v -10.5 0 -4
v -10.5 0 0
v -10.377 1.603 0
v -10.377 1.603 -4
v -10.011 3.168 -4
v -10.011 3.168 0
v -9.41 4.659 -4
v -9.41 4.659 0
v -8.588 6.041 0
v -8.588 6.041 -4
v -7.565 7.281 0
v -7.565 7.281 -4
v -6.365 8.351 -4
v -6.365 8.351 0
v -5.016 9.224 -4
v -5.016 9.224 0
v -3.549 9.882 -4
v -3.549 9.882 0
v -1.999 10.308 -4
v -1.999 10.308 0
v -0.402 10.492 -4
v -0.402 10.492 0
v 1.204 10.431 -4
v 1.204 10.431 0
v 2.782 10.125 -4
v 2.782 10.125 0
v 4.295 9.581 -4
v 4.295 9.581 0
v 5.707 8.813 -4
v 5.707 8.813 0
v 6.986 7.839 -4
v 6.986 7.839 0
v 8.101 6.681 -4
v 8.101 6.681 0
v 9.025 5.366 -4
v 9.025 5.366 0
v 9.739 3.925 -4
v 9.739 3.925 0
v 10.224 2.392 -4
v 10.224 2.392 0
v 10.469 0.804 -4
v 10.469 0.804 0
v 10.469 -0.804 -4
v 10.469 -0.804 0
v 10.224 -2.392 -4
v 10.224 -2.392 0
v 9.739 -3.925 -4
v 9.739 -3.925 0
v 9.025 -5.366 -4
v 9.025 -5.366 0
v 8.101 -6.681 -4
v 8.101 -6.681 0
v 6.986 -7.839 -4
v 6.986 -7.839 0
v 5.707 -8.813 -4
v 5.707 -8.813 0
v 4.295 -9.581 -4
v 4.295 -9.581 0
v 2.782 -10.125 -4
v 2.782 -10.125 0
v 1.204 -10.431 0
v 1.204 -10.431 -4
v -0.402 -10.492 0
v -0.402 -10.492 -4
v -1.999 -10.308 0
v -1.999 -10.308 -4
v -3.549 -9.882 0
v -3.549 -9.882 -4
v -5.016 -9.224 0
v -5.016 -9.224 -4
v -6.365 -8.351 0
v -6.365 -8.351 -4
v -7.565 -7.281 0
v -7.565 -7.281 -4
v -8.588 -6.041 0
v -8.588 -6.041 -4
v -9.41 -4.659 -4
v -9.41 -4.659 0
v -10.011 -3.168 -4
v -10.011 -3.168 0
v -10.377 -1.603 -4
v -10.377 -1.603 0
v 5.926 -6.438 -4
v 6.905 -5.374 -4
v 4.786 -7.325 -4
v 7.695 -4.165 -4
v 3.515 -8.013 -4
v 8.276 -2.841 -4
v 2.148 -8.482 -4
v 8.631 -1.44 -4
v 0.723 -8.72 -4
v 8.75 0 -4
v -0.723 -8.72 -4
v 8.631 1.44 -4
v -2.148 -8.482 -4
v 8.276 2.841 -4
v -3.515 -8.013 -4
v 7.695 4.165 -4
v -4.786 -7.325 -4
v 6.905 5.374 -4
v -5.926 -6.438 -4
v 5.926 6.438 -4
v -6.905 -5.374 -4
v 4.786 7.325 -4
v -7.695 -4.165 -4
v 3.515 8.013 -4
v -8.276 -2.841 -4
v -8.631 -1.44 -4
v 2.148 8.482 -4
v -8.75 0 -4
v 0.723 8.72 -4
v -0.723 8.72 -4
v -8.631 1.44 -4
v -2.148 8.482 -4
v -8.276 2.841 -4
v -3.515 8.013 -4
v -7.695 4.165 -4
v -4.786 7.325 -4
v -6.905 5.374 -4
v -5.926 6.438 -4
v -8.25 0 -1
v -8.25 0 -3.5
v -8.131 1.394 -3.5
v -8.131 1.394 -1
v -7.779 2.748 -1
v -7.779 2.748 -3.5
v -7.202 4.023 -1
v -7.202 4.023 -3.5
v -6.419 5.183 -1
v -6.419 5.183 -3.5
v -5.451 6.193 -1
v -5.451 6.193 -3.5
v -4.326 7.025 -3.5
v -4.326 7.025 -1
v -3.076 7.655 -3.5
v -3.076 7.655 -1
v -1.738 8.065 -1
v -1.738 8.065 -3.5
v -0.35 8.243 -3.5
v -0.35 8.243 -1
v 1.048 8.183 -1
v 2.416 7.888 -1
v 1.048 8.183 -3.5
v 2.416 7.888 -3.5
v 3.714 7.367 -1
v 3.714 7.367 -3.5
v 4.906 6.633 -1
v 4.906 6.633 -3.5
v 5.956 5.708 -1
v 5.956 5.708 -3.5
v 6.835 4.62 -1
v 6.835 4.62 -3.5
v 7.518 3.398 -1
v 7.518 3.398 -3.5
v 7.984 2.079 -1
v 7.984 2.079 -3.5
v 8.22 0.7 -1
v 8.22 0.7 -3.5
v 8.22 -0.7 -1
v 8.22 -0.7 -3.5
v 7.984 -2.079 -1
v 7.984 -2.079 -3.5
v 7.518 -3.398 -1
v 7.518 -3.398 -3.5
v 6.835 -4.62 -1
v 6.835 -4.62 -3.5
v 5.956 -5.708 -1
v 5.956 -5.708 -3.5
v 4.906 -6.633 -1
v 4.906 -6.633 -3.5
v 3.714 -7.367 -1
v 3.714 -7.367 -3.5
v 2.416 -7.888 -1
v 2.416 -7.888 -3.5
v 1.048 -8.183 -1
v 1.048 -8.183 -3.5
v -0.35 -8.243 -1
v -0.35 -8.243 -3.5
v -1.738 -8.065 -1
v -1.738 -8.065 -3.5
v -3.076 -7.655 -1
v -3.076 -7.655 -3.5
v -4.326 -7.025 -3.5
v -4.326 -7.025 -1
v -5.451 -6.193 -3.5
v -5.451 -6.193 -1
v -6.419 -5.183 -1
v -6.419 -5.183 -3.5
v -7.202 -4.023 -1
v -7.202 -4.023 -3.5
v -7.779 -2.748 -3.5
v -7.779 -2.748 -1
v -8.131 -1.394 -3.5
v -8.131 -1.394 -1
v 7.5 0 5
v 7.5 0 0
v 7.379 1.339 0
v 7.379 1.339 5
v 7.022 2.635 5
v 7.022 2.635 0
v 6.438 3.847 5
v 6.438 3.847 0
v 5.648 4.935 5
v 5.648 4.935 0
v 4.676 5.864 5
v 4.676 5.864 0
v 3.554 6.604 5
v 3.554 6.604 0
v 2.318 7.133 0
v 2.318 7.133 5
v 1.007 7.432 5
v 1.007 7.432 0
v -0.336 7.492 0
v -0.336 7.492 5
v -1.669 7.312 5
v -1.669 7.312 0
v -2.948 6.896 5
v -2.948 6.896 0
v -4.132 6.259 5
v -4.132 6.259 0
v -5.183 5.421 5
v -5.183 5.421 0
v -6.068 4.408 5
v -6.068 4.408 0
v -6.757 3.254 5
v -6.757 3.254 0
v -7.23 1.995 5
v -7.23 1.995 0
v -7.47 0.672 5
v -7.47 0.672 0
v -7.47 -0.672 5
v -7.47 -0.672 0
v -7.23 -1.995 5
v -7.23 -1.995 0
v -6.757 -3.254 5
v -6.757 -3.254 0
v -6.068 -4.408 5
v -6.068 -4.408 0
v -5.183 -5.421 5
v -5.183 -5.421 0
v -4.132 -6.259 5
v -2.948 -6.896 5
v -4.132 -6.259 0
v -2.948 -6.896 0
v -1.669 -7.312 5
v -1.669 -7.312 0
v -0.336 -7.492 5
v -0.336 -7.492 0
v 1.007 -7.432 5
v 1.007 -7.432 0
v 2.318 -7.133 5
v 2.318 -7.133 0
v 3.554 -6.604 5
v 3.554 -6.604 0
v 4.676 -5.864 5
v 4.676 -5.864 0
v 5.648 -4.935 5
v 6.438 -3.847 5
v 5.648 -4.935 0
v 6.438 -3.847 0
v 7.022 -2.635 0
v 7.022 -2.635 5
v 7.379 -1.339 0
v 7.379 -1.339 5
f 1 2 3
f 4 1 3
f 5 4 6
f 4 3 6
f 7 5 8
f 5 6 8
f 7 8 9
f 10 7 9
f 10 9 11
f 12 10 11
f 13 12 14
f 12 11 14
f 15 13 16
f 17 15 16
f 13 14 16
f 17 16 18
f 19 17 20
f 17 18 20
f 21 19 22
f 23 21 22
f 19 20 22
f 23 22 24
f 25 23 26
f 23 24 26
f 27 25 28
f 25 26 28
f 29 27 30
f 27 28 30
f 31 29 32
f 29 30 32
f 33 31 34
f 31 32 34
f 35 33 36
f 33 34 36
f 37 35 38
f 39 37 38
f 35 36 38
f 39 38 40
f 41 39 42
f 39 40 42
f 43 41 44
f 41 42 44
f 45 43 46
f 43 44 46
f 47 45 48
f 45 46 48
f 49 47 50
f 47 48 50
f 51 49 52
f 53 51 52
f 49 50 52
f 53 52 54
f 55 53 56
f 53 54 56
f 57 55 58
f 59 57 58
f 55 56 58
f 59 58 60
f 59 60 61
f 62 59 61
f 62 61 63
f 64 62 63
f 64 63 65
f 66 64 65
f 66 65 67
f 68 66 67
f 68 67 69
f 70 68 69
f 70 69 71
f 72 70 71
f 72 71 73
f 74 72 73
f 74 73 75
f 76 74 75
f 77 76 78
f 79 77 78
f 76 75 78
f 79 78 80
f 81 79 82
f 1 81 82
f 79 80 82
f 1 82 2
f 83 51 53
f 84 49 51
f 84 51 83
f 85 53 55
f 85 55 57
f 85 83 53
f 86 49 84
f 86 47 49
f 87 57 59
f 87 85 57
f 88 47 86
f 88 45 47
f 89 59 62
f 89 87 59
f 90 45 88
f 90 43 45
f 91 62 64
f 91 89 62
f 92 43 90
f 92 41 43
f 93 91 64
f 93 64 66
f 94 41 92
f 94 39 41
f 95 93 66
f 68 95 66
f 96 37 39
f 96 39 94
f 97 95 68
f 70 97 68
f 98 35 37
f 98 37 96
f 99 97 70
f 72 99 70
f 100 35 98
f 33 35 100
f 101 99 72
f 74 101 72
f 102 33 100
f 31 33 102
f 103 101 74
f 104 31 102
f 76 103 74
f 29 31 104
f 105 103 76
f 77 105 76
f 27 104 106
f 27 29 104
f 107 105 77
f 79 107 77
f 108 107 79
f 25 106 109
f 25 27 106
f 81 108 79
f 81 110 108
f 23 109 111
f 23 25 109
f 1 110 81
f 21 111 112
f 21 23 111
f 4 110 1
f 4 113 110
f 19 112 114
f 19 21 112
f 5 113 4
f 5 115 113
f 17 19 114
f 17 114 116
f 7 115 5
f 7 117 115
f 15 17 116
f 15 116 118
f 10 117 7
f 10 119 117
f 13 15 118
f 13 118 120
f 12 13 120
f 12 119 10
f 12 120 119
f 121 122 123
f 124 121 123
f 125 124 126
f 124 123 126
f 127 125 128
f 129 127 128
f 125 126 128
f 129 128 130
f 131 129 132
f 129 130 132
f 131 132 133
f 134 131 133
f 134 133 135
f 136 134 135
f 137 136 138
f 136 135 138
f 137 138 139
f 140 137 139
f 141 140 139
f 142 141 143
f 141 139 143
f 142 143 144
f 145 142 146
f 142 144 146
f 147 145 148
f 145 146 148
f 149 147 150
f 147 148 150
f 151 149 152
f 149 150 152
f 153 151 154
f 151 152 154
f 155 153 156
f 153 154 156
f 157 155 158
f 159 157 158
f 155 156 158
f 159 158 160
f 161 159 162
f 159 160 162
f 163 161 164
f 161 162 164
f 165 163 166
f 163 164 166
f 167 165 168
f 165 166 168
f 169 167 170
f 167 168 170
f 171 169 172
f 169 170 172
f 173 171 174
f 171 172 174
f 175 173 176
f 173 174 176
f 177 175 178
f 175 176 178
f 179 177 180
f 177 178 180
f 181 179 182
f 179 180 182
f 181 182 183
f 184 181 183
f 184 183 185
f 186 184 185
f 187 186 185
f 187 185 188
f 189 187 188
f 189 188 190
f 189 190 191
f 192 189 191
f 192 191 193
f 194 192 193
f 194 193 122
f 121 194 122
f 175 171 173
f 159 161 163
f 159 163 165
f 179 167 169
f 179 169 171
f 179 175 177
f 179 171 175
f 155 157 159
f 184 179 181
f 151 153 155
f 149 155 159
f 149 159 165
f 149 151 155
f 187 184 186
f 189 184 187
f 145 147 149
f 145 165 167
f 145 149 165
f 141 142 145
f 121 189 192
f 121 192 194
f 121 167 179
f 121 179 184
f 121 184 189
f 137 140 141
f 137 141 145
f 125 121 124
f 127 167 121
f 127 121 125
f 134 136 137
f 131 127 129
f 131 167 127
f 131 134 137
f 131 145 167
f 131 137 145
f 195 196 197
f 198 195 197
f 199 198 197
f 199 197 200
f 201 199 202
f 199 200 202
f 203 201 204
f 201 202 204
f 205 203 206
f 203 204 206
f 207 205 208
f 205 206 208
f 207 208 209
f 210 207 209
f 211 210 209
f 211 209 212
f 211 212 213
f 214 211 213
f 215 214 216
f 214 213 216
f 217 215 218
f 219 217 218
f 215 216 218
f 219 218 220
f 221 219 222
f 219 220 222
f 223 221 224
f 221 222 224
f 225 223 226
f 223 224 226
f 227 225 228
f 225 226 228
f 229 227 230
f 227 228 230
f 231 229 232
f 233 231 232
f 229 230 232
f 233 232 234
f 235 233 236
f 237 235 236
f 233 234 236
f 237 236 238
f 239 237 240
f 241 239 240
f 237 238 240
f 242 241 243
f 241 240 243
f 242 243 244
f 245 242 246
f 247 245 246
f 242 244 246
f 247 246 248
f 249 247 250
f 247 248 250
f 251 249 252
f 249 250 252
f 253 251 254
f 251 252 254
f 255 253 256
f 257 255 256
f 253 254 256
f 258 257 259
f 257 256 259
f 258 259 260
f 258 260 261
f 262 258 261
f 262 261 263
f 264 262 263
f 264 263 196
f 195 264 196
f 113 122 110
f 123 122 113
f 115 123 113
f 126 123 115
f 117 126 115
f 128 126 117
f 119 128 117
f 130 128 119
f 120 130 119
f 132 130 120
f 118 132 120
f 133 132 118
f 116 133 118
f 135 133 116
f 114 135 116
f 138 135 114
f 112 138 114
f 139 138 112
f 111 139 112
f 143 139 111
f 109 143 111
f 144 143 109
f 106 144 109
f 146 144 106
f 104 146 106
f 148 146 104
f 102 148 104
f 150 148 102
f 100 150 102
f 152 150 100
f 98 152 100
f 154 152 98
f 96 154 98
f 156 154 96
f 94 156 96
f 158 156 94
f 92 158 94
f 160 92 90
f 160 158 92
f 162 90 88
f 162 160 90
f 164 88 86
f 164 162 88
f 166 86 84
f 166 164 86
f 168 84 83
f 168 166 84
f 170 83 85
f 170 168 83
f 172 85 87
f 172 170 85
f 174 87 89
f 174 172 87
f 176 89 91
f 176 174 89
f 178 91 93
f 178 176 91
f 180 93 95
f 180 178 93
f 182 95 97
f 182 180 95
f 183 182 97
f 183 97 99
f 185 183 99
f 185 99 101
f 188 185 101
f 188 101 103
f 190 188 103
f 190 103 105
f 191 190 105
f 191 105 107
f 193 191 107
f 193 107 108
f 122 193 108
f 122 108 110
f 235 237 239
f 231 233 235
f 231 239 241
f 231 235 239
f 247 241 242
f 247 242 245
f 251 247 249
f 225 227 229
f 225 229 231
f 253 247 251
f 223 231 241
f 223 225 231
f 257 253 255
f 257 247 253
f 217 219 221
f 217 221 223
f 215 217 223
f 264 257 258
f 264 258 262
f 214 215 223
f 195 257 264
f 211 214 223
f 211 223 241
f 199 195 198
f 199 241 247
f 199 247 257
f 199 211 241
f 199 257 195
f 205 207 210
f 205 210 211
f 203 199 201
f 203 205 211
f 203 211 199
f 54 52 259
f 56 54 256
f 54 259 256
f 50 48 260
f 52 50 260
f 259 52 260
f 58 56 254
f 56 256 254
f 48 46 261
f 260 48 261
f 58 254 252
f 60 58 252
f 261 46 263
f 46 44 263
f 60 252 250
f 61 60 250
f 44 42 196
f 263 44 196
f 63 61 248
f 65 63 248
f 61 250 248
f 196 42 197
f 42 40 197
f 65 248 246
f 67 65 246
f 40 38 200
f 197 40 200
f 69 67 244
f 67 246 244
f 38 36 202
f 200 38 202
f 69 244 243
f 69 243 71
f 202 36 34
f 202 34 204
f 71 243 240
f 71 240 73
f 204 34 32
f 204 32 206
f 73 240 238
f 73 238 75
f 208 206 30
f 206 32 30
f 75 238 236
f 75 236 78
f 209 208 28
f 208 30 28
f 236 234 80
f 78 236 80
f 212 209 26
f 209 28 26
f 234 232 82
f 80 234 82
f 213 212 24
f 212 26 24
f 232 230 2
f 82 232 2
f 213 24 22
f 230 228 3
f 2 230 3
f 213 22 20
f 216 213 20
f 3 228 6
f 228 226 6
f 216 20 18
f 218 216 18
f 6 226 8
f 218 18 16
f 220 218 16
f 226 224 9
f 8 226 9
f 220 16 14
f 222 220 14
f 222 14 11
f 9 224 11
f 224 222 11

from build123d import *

# Parameters (mm, degrees)
SKETCH1_R           = 7.5
BOSS_EXTRUDE1_DEPTH = 5
SKETCH3_R           = 10.5
BOSS_EXTRUDE2_DEPTH = 4
SKETCH4_R           = 8.25
CUT_EXTRUDE1_DEPTH  = 3
CHAMFER1_SIZE       = 0.5


with BuildPart() as part:
    # Sketch1 → Boss-Extrude1 (new body)
    with BuildSketch(Plane.XY):
        Circle(SKETCH1_R)
    extrude(amount=BOSS_EXTRUDE1_DEPTH)

    # Sketch3 → Boss-Extrude2 (add)
    with BuildSketch(Plane(origin=(0, 0, 0), x_dir=(-1, 0, 0), z_dir=(0, 0, -1))):
        Circle(SKETCH3_R)
    extrude(amount=BOSS_EXTRUDE2_DEPTH)

    # Sketch4 → Cut-Extrude1 (cut)
    with BuildSketch(Plane(origin=(0, 0, -4), x_dir=(-1, 0, 0), z_dir=(0, 0, -1))):
        Circle(SKETCH4_R)
    extrude(amount=-CUT_EXTRUDE1_DEPTH, mode=Mode.SUBTRACT)

    # Chamfer1
    chamfer1_edges = [part.edges().sort_by_distance(p)[0] for p in [
        (8.25, 0, -4),
    ]]
    chamfer(chamfer1_edges, length=CHAMFER1_SIZE)


solid = part.part
